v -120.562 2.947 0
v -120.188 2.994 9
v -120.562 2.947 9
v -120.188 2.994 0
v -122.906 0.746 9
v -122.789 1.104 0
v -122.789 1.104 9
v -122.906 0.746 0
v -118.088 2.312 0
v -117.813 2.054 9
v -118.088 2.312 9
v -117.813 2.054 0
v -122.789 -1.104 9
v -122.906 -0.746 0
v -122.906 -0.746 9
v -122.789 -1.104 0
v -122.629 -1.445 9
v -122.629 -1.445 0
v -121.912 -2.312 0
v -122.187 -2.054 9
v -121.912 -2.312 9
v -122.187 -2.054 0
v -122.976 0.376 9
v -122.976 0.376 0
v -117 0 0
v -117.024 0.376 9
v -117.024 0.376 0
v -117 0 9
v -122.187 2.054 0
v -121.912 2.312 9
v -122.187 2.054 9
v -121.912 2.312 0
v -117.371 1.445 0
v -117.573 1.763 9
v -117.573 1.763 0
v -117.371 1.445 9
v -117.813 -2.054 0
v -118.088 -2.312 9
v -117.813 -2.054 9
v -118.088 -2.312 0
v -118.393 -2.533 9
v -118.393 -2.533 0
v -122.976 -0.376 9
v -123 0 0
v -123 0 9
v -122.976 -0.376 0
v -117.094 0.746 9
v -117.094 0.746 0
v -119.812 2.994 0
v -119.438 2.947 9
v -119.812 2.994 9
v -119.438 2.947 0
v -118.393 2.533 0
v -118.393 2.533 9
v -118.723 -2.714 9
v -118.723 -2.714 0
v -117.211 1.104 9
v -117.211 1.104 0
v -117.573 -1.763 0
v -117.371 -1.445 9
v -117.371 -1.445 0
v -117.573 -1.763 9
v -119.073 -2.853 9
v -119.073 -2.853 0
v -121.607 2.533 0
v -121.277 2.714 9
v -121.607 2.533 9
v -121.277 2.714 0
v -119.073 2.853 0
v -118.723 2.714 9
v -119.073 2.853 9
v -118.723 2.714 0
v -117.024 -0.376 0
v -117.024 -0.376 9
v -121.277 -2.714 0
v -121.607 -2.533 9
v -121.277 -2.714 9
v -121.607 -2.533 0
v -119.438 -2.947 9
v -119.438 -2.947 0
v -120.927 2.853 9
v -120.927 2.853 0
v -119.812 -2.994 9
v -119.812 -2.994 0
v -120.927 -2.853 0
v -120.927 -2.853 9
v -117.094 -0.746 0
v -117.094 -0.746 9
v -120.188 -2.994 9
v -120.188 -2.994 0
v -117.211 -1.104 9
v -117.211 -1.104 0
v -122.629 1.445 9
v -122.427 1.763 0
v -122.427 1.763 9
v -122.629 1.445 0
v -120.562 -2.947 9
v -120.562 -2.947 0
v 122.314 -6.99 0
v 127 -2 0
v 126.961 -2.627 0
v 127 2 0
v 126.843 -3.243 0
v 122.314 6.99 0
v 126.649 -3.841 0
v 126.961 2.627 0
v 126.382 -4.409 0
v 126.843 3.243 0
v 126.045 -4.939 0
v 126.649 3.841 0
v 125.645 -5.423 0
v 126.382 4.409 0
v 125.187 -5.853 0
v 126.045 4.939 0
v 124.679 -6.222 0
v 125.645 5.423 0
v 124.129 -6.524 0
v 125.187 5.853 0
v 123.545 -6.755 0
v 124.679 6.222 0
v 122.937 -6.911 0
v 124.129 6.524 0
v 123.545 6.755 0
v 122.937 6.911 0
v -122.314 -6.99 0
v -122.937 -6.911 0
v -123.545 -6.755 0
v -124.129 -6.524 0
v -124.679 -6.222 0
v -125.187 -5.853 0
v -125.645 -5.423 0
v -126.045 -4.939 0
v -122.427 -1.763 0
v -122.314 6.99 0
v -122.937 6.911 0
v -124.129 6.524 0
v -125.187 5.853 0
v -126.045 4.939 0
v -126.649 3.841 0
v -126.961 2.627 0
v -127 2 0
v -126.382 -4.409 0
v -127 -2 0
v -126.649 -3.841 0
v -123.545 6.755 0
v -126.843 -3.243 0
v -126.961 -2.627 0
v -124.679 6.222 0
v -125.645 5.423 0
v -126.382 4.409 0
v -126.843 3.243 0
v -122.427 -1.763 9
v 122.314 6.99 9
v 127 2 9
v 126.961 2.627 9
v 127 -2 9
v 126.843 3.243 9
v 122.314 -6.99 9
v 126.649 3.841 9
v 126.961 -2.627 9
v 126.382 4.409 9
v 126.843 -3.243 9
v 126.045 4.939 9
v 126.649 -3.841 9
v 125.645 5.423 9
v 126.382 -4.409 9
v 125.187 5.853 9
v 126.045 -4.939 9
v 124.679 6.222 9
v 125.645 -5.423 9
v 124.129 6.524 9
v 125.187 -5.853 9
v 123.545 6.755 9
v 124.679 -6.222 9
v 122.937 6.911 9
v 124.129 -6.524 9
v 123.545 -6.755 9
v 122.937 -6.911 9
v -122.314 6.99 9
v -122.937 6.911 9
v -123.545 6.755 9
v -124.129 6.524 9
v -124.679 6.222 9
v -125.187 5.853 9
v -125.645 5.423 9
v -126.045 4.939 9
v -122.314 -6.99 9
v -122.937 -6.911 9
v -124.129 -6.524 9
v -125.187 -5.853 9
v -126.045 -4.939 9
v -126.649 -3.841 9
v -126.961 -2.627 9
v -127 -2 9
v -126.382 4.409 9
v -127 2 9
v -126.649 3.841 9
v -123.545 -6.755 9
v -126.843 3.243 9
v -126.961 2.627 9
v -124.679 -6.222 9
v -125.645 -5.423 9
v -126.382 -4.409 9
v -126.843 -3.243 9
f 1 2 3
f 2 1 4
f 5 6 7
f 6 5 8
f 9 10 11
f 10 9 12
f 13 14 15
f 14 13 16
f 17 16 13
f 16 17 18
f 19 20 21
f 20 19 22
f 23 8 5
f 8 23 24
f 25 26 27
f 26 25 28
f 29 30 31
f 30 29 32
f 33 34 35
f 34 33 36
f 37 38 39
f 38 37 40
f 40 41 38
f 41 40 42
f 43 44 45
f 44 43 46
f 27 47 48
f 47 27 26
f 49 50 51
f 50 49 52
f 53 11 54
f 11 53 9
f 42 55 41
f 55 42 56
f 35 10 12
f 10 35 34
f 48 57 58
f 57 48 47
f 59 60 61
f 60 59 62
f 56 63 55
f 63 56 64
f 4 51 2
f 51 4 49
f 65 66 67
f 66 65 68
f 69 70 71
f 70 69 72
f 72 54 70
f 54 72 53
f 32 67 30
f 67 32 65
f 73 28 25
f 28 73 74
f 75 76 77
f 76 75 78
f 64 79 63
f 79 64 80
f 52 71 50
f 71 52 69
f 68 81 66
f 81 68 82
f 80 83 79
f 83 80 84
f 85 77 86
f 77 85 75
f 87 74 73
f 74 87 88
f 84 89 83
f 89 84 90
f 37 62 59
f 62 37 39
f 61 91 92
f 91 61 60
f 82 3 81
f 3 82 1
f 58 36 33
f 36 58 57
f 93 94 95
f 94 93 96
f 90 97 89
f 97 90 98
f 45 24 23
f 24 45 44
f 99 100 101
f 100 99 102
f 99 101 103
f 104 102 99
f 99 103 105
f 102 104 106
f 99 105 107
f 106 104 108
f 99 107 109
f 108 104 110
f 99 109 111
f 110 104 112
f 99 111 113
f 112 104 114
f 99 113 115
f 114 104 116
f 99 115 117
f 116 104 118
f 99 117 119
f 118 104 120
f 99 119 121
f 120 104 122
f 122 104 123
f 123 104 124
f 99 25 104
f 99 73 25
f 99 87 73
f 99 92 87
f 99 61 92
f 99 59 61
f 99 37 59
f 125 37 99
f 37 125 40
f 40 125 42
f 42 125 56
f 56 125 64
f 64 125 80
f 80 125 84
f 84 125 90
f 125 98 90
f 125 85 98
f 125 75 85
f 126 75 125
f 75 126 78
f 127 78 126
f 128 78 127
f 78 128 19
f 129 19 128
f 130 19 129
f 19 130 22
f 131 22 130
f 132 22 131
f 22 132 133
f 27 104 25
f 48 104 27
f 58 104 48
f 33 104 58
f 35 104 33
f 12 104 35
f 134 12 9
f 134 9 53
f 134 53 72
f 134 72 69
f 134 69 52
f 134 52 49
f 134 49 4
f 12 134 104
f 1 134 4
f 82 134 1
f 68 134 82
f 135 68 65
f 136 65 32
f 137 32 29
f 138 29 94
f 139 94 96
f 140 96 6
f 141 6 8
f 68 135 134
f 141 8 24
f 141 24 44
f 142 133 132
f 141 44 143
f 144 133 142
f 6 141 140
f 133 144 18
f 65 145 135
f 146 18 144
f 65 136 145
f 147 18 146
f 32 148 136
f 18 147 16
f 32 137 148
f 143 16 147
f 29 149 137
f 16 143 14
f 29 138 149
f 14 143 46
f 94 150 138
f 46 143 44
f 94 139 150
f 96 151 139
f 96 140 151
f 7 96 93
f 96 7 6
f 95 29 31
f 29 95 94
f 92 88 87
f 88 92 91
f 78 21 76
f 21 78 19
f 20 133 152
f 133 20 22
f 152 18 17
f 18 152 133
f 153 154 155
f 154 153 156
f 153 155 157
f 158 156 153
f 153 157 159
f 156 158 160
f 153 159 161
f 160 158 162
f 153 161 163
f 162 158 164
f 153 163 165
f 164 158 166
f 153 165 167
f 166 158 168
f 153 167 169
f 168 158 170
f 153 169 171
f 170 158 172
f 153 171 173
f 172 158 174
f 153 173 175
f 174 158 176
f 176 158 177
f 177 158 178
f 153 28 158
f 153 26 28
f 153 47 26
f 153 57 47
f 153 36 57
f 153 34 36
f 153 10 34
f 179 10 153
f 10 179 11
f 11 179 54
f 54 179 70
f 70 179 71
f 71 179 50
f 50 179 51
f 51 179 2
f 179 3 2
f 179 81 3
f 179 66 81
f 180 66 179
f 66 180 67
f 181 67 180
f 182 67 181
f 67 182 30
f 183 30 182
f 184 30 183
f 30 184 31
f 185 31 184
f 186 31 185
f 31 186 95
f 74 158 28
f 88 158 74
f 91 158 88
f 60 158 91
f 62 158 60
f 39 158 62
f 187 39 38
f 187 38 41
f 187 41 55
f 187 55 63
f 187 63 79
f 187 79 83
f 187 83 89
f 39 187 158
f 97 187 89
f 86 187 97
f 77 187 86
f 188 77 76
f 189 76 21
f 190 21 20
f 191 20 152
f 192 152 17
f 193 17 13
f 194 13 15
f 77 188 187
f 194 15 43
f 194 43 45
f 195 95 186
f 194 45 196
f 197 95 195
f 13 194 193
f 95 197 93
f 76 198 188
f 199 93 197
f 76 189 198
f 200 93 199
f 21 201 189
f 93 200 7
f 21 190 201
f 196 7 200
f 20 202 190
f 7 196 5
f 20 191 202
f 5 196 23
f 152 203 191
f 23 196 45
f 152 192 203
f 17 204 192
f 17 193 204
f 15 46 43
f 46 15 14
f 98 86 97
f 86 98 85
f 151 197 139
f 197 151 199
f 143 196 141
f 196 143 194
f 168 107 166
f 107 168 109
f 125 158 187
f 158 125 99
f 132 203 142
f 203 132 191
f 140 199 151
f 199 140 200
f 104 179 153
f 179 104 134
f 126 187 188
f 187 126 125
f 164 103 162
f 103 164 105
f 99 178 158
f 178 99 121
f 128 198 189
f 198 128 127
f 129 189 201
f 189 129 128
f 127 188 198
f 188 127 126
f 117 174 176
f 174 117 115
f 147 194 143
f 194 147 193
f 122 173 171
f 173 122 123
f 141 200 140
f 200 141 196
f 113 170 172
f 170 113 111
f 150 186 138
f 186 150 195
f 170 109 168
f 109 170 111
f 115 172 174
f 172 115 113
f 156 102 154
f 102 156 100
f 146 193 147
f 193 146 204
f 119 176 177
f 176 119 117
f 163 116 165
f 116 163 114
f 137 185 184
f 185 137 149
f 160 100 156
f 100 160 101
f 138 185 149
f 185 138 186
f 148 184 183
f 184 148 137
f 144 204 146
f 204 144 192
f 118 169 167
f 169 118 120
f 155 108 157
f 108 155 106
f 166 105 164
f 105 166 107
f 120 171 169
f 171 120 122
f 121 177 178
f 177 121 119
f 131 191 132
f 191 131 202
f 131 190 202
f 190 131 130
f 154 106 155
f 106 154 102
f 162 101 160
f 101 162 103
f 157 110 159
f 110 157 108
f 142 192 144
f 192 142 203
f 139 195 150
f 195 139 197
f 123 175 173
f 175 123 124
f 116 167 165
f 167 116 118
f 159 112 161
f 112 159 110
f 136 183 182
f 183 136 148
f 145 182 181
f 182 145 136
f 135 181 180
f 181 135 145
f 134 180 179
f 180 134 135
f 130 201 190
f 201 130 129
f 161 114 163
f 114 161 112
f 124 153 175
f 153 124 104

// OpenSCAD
$fn = 50;


difference() {
	union() {
		hull() {
			translate(v = [-122.0000000000, 2.0000000000, 0]) {
				cylinder(h = 9, r = 5);
			}
			translate(v = [122.0000000000, 2.0000000000, 0]) {
				cylinder(h = 9, r = 5);
			}
			translate(v = [-122.0000000000, -2.0000000000, 0]) {
				cylinder(h = 9, r = 5);
			}
			translate(v = [122.0000000000, -2.0000000000, 0]) {
				cylinder(h = 9, r = 5);
			}
		}
	}
	union() {
		translate(v = [-120.0000000000, 0.0000000000, 0]) {
			cylinder(h = 9, r = 3.0000000000);
		}
		translate(v = [-120.0000000000, 0.0000000000, 0]) {
			cylinder(h = 9, r = 1.5000000000);
		}
		translate(v = [-120.0000000000, 0.0000000000, 0]) {
			cylinder(h = 9, r = 1.5000000000);
		}
		translate(v = [-120.0000000000, 0.0000000000, 0]) {
			cylinder(h = 9, r = 1.5000000000);
		}
	}
}
